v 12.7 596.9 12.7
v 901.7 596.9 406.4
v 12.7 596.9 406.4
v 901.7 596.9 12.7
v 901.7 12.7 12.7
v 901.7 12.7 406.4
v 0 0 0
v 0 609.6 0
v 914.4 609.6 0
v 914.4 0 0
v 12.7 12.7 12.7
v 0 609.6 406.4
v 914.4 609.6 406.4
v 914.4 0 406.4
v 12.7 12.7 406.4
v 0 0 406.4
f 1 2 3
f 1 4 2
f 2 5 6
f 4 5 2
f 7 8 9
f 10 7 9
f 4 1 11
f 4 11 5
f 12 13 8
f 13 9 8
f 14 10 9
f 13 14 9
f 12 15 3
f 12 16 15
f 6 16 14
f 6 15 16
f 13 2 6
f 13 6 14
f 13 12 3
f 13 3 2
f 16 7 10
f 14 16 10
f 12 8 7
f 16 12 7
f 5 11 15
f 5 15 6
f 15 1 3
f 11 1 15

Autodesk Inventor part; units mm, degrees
ref_plane "YZ Plane" through (0, 0, 0) normal (1, 0, 0) x (0, 1, 0)
ref_plane "XZ Plane" through (0, 0, 0) normal (0, 1, 0) x (-1, 0, 0)
sketch "Sketch1" plane through (0, 0, 0) normal (0, 0, 1) x (1, 0, 0)
  line L0 (0, 0) -> (914.4, 0)
  line L1 (914.4, 0) -> (914.4, 609.6)
  line L2 (914.4, 609.6) -> (0, 609.6)
  line L3 (0, 609.6) -> (0, 0)
  line L4 (12.7, 12.7) -> (901.7, 12.7)
  line L5 (901.7, 12.7) -> (901.7, 596.9)
  line L6 (901.7, 596.9) -> (12.7, 596.9)
  line L7 (12.7, 596.9) -> (12.7, 12.7)
  dimension "d0" = 609.6
  dimension "d1" = 914.4
  dimension "d2" = 12.7
  dimension "d3" = 12.7
  dimension "d4" = 12.7
  dimension "d5" = 12.7
extrude "Extrusion1" add sketch "Sketch1" along normal blind 406.4
extrude "Extrusion2" add sketch "Sketch1" along normal blind 12.7 contours L7 L6 L5 L4
ref_plane "Work Plane1" through (0, 304.8, 0) normal (0, -1, 0) x (1, 0, 0)
equation "\"d0\" = length"
equation "\"d1\" = width"
equation "\"d2\" = thickness"
equation "\"d3\" = thickness"
equation "\"d4\" = thickness"
equation "\"d5\" = thickness"
equation "\"d6\" = height"
equation "\"d8\" = thickness"
equation "\"length\" = 609.6"
equation "\"width\" = 914.4"
equation "\"height\" = 406.4"
equation "\"thickness\" = 12.7"
properties part number "box"
